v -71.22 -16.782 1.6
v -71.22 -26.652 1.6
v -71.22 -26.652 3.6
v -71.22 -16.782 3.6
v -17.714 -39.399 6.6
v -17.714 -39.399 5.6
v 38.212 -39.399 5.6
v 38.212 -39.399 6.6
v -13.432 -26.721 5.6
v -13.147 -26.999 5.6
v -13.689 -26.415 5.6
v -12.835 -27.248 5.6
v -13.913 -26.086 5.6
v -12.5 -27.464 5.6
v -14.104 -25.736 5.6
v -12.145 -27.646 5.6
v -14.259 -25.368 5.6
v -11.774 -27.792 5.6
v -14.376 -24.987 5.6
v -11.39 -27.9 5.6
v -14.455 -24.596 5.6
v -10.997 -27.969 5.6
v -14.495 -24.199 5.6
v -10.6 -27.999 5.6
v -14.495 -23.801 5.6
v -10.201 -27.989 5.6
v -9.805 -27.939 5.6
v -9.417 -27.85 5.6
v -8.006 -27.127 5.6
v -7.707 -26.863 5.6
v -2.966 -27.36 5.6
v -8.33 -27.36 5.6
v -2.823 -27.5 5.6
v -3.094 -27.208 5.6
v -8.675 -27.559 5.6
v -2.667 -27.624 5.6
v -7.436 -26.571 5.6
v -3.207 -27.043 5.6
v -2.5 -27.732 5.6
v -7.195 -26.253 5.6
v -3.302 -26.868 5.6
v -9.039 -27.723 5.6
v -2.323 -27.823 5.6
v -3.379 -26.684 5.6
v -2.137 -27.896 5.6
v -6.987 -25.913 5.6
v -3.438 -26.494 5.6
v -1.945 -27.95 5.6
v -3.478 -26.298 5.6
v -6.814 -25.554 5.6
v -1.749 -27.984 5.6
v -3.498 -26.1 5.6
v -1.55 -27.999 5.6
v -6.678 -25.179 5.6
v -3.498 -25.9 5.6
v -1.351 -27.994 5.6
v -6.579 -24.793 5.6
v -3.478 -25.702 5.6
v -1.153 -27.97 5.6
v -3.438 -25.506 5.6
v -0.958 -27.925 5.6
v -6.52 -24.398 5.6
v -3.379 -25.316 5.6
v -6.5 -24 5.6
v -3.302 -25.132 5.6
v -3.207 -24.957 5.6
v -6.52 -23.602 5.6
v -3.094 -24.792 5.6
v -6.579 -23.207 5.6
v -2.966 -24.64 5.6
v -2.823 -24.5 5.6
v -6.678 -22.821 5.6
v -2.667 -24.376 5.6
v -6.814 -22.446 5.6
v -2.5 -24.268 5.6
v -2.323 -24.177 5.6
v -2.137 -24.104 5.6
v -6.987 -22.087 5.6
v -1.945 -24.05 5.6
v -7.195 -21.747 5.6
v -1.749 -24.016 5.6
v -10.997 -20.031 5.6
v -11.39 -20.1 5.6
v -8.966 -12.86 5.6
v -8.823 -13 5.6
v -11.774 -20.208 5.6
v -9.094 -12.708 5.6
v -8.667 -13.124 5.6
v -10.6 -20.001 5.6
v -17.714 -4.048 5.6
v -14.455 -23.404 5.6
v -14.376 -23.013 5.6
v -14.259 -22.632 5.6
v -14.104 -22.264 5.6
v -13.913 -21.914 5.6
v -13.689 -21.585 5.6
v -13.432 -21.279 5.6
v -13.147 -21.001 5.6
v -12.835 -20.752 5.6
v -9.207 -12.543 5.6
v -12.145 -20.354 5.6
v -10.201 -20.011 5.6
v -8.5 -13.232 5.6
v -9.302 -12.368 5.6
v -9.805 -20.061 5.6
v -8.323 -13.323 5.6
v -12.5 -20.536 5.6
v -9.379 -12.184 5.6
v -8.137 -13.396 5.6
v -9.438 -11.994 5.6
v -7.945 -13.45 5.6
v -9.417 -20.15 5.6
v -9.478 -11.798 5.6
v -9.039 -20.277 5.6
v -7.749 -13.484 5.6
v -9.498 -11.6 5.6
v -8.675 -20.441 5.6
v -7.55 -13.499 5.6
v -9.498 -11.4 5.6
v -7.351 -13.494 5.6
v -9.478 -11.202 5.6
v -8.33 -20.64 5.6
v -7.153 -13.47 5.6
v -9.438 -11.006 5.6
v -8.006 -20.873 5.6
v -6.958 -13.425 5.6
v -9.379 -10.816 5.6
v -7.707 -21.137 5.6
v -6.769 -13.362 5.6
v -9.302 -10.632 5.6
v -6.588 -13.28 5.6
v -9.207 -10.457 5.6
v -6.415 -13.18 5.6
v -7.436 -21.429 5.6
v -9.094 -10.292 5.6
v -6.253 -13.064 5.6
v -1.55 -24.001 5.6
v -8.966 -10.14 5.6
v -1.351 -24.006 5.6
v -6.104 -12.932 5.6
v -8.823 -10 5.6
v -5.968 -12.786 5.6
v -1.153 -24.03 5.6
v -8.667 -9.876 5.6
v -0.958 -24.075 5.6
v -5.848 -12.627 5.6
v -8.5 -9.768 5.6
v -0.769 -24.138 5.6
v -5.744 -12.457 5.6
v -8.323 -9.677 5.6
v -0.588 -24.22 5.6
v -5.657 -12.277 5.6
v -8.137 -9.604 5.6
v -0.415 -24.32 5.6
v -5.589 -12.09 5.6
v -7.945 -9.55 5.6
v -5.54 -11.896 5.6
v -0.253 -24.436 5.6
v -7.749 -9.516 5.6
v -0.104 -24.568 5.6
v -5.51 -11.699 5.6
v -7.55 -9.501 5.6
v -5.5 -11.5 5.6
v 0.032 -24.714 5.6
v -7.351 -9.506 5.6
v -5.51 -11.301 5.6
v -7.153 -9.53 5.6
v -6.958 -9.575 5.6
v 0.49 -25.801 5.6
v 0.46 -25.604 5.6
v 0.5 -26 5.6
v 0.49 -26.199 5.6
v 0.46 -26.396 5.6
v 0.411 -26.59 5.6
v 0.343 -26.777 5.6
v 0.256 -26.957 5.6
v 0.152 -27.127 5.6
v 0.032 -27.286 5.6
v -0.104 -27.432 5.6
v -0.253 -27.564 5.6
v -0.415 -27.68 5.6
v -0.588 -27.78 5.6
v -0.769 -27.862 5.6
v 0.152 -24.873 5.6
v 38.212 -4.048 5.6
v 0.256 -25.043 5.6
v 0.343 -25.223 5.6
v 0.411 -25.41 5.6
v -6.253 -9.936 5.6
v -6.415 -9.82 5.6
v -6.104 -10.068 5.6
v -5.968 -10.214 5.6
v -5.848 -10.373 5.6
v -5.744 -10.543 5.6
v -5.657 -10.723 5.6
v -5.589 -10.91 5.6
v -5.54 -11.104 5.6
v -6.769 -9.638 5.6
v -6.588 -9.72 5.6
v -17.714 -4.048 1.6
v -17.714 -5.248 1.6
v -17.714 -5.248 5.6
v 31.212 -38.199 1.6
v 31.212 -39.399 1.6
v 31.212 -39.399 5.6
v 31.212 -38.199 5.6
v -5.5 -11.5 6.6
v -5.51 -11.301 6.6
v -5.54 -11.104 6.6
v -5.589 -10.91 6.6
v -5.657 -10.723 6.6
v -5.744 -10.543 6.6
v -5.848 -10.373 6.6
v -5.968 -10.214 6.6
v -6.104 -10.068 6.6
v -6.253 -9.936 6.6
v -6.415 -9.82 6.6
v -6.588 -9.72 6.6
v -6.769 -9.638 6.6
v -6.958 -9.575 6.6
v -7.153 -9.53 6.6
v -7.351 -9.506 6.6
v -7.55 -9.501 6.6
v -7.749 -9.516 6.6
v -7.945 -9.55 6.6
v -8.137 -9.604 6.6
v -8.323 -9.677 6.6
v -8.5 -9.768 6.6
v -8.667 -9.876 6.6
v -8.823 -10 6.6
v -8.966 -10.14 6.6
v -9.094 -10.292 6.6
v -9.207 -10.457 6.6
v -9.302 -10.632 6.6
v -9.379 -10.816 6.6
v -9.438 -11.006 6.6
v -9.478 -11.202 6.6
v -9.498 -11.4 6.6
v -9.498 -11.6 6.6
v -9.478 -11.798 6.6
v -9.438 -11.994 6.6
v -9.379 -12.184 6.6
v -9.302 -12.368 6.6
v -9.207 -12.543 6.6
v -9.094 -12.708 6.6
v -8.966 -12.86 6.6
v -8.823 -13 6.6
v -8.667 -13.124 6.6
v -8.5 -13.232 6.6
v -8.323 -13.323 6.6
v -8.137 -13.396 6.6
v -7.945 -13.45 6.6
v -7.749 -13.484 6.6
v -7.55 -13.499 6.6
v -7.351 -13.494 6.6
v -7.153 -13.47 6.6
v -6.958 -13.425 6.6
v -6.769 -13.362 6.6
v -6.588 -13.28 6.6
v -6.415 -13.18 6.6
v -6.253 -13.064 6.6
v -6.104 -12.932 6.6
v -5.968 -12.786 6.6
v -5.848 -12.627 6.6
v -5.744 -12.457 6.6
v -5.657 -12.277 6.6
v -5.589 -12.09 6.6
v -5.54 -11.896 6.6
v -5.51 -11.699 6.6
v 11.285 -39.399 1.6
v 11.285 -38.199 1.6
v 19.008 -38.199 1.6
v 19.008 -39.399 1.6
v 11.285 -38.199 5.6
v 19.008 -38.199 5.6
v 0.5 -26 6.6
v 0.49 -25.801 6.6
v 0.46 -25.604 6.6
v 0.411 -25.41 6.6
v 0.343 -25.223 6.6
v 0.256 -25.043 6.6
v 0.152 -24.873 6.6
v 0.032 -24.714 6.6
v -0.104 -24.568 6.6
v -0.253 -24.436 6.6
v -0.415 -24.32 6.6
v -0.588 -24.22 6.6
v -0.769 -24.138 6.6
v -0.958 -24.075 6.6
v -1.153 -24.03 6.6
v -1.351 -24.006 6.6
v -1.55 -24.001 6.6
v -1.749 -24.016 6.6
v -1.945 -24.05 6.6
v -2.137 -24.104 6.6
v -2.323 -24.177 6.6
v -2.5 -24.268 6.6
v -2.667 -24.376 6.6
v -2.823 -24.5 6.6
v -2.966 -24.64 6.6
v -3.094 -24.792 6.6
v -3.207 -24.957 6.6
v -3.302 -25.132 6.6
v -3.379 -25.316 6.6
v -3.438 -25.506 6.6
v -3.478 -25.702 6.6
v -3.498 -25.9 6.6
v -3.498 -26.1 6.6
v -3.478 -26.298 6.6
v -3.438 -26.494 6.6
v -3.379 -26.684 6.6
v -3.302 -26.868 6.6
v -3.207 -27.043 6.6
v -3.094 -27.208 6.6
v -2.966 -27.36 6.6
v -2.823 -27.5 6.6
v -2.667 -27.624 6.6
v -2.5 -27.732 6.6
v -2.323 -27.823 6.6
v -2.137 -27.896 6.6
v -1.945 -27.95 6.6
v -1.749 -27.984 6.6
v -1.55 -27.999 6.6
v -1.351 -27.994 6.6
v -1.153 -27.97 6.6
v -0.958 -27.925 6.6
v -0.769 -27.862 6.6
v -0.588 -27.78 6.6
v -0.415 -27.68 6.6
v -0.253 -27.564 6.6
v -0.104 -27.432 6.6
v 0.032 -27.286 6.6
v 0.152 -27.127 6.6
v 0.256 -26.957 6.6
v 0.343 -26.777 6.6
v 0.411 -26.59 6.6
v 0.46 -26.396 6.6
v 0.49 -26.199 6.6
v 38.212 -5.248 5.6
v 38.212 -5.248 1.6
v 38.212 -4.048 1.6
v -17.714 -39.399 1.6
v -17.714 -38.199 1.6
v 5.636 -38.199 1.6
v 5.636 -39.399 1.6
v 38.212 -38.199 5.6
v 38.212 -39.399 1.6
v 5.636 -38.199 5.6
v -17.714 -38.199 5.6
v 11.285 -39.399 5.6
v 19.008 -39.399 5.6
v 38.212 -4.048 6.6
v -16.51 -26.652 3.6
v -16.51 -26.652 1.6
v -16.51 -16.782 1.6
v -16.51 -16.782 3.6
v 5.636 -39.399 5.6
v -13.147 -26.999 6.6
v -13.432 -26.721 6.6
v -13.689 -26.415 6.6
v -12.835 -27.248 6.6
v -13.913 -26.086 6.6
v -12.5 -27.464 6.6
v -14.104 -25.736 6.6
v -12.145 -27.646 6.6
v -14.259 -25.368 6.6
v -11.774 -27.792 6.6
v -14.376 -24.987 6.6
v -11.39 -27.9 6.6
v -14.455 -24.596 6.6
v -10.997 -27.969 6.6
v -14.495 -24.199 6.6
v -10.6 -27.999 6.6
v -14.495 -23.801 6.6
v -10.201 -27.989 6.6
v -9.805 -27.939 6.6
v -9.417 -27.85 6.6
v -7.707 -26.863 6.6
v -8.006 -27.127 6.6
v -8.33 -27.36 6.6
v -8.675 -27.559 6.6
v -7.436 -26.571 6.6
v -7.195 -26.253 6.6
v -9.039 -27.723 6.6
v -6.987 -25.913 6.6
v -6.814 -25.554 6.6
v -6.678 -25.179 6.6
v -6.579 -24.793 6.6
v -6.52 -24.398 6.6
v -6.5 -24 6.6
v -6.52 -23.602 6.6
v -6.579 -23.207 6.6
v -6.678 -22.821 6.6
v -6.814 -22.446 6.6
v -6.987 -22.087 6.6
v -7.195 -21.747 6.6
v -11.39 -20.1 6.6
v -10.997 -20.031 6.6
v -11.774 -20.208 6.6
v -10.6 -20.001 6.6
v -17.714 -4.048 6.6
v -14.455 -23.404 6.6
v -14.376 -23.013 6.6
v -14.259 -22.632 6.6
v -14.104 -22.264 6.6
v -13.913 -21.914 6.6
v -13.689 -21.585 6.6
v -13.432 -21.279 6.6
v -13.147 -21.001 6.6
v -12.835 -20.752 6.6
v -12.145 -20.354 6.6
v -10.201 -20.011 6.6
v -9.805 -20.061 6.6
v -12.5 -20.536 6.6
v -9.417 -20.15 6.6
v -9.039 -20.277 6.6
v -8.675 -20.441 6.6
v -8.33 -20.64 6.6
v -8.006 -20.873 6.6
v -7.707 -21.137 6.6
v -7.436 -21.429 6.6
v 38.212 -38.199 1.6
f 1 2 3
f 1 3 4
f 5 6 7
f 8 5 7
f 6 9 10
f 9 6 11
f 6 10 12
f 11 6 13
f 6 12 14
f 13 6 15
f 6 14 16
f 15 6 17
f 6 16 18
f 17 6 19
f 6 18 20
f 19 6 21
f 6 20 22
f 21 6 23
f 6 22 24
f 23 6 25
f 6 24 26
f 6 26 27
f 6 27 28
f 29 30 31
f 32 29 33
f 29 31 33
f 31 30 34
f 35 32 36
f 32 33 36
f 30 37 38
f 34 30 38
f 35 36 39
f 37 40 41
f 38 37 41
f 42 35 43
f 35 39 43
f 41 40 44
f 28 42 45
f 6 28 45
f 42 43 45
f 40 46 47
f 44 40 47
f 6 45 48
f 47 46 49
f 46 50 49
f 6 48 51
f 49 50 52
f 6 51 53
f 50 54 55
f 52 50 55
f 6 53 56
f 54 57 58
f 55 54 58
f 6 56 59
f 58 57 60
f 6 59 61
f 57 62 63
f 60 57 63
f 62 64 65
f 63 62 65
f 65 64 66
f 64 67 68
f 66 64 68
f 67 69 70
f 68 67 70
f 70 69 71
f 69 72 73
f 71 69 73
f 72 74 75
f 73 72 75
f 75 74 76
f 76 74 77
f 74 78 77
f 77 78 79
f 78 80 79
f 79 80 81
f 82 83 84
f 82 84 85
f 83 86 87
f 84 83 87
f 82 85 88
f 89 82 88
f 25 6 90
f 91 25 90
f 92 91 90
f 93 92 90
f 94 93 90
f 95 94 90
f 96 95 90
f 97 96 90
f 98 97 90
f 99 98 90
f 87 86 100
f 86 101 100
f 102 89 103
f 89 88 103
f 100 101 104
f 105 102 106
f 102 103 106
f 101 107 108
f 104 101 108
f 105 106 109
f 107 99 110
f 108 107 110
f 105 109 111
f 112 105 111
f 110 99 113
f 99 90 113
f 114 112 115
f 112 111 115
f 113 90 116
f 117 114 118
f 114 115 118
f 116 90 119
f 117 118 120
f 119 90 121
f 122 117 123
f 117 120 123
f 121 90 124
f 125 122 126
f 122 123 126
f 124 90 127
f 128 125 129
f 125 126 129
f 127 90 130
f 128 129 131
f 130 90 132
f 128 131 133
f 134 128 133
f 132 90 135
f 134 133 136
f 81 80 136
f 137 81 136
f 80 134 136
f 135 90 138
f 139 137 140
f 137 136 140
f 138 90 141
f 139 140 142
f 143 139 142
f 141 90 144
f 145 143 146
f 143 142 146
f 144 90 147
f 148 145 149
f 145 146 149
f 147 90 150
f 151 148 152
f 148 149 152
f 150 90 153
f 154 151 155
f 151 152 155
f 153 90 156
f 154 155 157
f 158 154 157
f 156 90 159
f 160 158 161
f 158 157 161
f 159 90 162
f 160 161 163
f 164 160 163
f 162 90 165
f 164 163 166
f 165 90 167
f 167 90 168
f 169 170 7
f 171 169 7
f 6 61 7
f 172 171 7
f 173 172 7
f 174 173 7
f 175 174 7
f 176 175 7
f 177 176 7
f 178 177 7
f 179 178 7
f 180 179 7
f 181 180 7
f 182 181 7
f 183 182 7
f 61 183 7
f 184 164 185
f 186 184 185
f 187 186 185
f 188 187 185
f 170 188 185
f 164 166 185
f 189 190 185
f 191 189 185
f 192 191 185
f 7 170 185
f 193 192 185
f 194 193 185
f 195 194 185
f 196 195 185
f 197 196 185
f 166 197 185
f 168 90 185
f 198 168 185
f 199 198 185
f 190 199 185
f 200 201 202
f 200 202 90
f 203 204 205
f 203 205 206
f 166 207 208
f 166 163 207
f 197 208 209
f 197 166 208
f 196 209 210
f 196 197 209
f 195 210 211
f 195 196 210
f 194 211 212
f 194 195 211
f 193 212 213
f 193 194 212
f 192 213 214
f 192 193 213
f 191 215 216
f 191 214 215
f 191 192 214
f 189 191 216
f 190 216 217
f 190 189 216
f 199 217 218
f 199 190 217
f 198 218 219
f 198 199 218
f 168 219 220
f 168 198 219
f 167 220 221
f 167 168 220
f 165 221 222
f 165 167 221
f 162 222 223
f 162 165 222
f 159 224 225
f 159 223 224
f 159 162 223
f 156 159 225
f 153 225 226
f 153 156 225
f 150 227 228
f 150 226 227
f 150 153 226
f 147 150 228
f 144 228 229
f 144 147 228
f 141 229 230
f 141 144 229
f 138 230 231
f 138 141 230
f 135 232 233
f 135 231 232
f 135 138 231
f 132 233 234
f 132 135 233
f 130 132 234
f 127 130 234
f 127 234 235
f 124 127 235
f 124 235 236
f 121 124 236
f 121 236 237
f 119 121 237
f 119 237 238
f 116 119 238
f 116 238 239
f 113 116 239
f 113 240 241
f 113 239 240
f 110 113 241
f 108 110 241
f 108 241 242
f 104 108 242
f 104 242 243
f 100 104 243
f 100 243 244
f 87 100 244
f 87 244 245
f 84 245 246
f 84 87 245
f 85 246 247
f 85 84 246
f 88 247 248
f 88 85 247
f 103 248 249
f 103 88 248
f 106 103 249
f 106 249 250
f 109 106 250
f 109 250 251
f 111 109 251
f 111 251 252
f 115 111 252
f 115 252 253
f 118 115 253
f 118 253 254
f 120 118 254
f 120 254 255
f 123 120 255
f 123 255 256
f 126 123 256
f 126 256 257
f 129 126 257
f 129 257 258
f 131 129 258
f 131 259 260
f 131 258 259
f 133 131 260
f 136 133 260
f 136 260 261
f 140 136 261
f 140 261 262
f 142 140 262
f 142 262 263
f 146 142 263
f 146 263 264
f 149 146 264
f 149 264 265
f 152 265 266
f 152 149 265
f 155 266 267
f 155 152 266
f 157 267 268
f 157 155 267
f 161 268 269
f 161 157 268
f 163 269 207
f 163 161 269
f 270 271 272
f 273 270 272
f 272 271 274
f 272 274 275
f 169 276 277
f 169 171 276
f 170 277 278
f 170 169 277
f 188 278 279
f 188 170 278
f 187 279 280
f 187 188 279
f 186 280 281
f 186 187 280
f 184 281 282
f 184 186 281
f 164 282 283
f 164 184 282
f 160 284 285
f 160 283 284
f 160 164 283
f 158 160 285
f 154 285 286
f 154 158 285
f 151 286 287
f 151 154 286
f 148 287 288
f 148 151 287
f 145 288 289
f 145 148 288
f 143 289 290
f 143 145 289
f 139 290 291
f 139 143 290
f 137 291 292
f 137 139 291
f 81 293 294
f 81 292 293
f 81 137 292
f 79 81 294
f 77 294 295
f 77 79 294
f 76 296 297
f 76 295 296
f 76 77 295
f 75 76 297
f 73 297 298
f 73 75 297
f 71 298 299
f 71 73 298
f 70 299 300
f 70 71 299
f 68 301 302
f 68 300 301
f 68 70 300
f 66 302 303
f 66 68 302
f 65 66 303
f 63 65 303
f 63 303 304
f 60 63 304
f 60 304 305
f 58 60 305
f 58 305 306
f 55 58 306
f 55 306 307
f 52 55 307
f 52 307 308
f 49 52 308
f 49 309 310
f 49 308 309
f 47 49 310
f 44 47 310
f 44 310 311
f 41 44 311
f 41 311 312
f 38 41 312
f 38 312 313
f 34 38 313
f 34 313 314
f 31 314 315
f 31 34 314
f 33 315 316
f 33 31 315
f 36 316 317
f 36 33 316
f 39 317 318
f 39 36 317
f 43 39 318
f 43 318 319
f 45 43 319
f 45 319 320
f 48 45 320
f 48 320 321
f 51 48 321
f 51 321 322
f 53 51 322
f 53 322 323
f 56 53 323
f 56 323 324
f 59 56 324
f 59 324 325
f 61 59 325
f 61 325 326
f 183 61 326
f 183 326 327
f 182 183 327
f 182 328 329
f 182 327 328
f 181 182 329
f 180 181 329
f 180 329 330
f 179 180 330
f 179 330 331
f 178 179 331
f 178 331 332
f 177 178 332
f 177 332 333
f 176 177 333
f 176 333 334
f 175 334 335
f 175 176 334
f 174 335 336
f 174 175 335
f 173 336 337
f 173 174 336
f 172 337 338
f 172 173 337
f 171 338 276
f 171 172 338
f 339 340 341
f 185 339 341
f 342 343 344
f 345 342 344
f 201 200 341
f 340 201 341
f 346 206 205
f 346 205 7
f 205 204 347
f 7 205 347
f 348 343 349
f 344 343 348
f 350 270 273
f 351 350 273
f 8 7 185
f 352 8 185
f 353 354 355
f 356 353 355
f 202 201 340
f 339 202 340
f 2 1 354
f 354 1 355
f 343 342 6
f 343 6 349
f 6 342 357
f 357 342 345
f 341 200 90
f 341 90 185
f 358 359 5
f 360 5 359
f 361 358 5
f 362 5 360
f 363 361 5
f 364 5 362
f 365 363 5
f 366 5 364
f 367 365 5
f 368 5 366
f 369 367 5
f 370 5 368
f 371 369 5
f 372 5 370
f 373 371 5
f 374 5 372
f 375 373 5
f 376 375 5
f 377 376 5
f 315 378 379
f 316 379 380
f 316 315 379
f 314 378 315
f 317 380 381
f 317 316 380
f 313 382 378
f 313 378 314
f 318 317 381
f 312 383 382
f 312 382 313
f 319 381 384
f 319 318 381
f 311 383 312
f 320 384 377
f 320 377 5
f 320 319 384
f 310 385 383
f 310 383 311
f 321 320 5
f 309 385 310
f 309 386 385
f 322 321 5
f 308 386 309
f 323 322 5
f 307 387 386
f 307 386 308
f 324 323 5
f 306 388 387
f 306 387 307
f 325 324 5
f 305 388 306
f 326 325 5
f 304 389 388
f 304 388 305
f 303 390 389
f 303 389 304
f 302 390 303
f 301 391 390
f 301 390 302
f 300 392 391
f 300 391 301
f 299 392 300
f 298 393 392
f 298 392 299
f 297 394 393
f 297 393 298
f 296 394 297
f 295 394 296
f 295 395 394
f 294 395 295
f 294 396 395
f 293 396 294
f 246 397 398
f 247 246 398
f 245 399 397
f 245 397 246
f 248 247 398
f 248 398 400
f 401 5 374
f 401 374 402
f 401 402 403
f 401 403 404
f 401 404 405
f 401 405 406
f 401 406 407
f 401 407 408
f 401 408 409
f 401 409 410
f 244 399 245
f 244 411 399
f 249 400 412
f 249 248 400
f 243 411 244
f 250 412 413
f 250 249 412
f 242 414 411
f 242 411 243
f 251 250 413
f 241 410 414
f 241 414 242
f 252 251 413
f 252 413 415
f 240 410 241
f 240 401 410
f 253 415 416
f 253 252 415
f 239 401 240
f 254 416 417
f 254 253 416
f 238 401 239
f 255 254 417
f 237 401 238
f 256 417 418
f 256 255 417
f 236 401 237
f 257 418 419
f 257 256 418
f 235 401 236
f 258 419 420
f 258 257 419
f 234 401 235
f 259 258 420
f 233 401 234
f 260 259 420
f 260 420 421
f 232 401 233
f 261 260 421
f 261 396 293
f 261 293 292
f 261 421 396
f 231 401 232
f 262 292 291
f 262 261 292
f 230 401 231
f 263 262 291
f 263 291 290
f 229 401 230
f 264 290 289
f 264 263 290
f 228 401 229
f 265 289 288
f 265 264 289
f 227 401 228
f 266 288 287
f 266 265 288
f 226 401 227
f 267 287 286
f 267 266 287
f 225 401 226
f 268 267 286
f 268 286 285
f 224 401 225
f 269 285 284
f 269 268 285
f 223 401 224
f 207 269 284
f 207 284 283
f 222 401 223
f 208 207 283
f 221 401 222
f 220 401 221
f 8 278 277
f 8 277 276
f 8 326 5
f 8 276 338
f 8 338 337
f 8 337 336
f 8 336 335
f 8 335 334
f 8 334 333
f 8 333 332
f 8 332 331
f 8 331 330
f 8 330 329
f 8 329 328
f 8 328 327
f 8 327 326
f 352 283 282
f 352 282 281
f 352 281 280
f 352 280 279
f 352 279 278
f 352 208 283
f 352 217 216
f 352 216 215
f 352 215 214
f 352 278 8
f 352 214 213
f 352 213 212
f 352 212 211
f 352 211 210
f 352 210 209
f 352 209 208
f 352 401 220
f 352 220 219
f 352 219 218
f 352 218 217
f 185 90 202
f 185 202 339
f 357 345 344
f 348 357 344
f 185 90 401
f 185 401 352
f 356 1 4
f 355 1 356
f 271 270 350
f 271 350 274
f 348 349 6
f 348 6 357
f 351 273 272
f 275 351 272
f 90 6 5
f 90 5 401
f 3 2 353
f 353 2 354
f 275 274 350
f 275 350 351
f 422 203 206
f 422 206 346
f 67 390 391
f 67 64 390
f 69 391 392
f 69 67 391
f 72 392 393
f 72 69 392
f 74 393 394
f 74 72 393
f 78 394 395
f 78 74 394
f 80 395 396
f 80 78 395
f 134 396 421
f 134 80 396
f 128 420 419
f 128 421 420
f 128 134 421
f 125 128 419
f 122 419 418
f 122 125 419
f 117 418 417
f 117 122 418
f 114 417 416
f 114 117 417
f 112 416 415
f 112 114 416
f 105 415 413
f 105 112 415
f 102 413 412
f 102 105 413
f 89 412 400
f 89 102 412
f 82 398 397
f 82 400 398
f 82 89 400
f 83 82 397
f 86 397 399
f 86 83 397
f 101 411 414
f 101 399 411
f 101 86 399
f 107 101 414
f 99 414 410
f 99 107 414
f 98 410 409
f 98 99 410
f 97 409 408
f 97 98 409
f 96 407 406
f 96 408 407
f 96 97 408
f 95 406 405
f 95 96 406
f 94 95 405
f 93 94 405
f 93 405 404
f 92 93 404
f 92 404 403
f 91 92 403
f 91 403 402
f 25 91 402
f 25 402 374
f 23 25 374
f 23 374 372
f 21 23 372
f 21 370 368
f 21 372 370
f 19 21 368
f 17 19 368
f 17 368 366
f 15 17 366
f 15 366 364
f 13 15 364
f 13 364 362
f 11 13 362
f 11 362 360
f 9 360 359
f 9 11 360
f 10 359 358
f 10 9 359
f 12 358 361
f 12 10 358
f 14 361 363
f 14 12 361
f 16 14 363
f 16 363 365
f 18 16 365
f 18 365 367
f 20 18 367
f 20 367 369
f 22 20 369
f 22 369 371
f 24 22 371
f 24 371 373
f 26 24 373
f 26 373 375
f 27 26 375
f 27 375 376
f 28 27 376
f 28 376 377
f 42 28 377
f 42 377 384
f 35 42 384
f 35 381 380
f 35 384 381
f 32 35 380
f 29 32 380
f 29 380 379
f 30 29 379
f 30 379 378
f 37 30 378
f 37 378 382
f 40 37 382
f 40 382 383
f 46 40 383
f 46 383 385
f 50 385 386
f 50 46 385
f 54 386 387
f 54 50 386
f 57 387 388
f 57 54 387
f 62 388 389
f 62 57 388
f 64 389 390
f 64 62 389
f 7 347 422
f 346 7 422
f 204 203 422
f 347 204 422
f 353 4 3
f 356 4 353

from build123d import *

# Parameters (mm, degrees)
SKETCH003_W       = 7
SKETCH003_H       = 1.2
EXTRUDE024_DEPTH  = 4
SKETCH005_W       = 7.722949
SKETCH005_H       = 1.2
EXTRUDE026_DEPTH  = 4
SKETCH007_W       = 23.35
SKETCH007_H       = 1.2
EXTRUDE028_DEPTH  = 4
SKETCH012_W       = 54.71
SKETCH012_H       = 9.87
EXTRUDE031_DEPTH  = 2
CYLINDER001_R     = 4
CYLINDER001_DEPTH = 10
CYLINDER002_R     = 2
CYLINDER002_DEPTH = 10
CYLINDER_R        = 2
CYLINDER_DEPTH    = 10
SKETCH_W          = 55.926
SKETCH_H          = 35.3506
EXTRUDE_DEPTH     = 1
SKETCH006_W       = 55.926
SKETCH006_H       = 1.2
EXTRUDE027_DEPTH  = 4


with BuildPart() as extrude024:
    # Sketch003 → Extrude024 (new body)
    with BuildSketch(Plane.XY.offset(1.6)):
        with Locations((34.712, -38.799)):
            Rectangle(SKETCH003_W, SKETCH003_H)
    extrude(amount=EXTRUDE024_DEPTH)


with BuildPart() as extrude026:
    # Sketch005 → Extrude026 (new body)
    with BuildSketch(Plane.XY.offset(1.6)):
        with Locations((15.14658, -38.799)):
            Rectangle(SKETCH005_W, SKETCH005_H)
    extrude(amount=EXTRUDE026_DEPTH)


with BuildPart() as extrude028:
    # Sketch007 → Extrude028 (new body)
    with BuildSketch(Plane.XY.offset(1.6)):
        with Locations((-6.039, -38.799)):
            Rectangle(SKETCH007_W, SKETCH007_H)
    extrude(amount=EXTRUDE028_DEPTH)


with BuildPart() as extrude031:
    # Sketch012 → Extrude031 (new body)
    with BuildSketch(Plane.XY.offset(1.6)):
        with Locations((-43.865036, -21.717)):
            Rectangle(SKETCH012_W, SKETCH012_H)
    extrude(amount=EXTRUDE031_DEPTH)


with BuildPart() as cylinder001:
    # Cylinder001 → Cylinder001 (new body)
    with BuildSketch(Plane(origin=(-10.5, -24, 3), x_dir=(1, 0, 0), z_dir=(0, 0, 1))):
        Circle(CYLINDER001_R)
    extrude(amount=CYLINDER001_DEPTH)


with BuildPart() as cylinder002:
    # Cylinder002 → Cylinder002 (new body)
    with BuildSketch(Plane(origin=(-7.5, -11.5, 2.5), x_dir=(1, 0, 0), z_dir=(0, 0, 1))):
        Circle(CYLINDER002_R)
    extrude(amount=CYLINDER002_DEPTH)


with BuildPart() as cylinder:
    # Cylinder → Cylinder (new body)
    with BuildSketch(Plane(origin=(-1.5, -26, 2.5), x_dir=(1, 0, 0), z_dir=(0, 0, 1))):
        Circle(CYLINDER_R)
    extrude(amount=CYLINDER_DEPTH)


with BuildPart() as cut002:
    # Sketch (on Face6 of Extrude027) → Extrude (new body)
    with BuildSketch(Plane.XY.offset(5.6)):
        with Locations((10.249, -21.7237)):
            Rectangle(SKETCH_W, SKETCH_H)
    extrude(amount=EXTRUDE_DEPTH)

    # Cut: cut Cylinder
    add(cylinder.part, mode=Mode.SUBTRACT)

    # Cut001: cut Cylinder002
    add(cylinder002.part, mode=Mode.SUBTRACT)

    # Cut002: cut Cylinder001
    add(cylinder001.part, mode=Mode.SUBTRACT)


with BuildPart() as extrude027:
    # Sketch006 → Extrude027 (new body)
    with BuildSketch(Plane.XY.offset(1.6)):
        with Locations((10.249, -4.6484)):
            Rectangle(SKETCH006_W, SKETCH006_H)
    extrude(amount=EXTRUDE027_DEPTH)


solid = Compound([extrude024.part, extrude026.part, extrude028.part, extrude031.part, cut002.part, extrude027.part])
